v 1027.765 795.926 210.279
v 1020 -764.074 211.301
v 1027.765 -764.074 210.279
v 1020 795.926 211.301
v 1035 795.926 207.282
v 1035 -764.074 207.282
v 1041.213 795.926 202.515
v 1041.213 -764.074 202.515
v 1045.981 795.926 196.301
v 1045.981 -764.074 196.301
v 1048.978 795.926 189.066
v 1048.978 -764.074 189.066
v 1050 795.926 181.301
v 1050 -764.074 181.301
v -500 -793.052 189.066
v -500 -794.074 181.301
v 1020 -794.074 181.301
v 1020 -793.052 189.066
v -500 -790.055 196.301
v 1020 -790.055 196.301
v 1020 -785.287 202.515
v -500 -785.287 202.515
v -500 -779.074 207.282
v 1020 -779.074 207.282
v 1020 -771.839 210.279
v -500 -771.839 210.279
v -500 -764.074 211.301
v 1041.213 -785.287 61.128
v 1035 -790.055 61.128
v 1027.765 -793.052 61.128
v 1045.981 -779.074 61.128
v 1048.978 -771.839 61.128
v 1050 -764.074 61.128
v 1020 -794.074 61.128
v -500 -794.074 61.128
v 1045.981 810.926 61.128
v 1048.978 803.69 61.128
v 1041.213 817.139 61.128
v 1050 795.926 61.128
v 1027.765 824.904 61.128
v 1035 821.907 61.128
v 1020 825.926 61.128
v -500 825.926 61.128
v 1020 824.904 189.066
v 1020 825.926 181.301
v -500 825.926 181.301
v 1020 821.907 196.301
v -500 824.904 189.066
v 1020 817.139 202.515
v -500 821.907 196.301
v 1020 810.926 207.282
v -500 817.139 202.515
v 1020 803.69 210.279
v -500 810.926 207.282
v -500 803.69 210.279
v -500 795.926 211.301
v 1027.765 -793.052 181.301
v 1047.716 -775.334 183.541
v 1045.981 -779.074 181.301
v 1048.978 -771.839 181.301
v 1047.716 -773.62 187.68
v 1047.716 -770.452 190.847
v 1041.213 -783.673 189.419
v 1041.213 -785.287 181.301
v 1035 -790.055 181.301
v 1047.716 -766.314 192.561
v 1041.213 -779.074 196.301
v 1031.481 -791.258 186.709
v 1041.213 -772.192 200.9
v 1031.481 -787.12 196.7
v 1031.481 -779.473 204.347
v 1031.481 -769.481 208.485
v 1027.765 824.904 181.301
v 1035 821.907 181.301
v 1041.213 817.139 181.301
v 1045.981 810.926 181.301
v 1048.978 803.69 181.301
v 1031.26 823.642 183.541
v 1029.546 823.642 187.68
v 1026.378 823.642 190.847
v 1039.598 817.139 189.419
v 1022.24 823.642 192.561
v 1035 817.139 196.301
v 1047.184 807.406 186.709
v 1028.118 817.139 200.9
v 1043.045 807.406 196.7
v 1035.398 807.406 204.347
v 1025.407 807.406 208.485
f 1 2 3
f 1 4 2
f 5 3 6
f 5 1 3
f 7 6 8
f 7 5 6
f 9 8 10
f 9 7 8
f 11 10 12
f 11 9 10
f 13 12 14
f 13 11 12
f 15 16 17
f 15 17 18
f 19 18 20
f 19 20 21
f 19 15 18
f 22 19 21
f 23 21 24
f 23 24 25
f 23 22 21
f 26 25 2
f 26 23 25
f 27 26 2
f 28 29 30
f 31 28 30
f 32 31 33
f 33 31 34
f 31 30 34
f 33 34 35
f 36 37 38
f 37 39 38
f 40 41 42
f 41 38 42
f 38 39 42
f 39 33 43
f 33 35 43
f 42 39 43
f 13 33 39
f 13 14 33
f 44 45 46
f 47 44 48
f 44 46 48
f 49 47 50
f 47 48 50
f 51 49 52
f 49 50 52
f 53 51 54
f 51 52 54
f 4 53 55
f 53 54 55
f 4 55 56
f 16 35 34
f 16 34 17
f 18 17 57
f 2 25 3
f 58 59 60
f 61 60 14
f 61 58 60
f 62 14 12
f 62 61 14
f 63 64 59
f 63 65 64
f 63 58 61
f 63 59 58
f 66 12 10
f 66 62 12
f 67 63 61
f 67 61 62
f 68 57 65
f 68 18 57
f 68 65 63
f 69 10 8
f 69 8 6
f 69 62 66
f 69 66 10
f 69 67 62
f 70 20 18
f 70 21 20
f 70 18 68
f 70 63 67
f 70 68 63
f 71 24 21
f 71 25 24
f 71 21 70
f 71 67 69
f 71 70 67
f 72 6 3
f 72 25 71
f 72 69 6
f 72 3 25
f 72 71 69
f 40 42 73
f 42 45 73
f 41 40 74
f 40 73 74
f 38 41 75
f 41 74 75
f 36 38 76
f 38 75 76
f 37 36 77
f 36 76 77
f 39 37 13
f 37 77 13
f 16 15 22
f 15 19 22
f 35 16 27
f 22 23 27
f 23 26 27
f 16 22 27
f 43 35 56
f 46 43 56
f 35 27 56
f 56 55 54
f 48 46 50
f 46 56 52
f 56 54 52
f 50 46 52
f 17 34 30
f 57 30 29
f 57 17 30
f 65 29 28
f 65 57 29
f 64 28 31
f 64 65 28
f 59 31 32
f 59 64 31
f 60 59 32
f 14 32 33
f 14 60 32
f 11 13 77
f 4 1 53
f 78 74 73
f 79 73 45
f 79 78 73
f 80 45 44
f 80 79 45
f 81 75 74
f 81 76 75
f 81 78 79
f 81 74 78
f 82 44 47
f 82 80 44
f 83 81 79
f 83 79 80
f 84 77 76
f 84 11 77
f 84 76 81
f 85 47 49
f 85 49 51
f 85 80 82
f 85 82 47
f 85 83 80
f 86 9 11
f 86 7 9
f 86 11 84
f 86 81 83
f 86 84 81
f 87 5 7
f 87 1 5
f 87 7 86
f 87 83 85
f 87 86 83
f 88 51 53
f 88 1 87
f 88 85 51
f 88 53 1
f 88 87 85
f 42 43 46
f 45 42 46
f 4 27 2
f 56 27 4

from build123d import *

# Parameters (mm, degrees)
F0_W     = 1620
F0_H     = 150.173813
F1_DEPTH = 500
F2_DEPTH = 1050
F3_R     = 30


with BuildPart() as f1:
    # F0 (on Right) → F1 (new body)
    with BuildSketch(Plane.YZ):
        with Locations((15.925775, 136.214563)):
            Rectangle(F0_W, F0_H)
    extrude(amount=-F1_DEPTH)

    # F0 (on Right) → F2 (join)
    with BuildSketch(Plane.YZ):
        with Locations((15.925775, 136.214563)):
            Rectangle(F0_W, F0_H)
    extrude(amount=F2_DEPTH)

    # F3
    f3_edges = [f1.edges().sort_by_distance(p)[0] for p in [
        (275, -794.074225, 211.30147),
        (1050, -794.074225, 136.214564),
        (1050, 15.925775, 211.30147),
        (1050, 825.925775, 136.214564),
        (275, 825.925775, 211.30147),
    ]]
    fillet(f3_edges, radius=F3_R)


solid = f1.part
